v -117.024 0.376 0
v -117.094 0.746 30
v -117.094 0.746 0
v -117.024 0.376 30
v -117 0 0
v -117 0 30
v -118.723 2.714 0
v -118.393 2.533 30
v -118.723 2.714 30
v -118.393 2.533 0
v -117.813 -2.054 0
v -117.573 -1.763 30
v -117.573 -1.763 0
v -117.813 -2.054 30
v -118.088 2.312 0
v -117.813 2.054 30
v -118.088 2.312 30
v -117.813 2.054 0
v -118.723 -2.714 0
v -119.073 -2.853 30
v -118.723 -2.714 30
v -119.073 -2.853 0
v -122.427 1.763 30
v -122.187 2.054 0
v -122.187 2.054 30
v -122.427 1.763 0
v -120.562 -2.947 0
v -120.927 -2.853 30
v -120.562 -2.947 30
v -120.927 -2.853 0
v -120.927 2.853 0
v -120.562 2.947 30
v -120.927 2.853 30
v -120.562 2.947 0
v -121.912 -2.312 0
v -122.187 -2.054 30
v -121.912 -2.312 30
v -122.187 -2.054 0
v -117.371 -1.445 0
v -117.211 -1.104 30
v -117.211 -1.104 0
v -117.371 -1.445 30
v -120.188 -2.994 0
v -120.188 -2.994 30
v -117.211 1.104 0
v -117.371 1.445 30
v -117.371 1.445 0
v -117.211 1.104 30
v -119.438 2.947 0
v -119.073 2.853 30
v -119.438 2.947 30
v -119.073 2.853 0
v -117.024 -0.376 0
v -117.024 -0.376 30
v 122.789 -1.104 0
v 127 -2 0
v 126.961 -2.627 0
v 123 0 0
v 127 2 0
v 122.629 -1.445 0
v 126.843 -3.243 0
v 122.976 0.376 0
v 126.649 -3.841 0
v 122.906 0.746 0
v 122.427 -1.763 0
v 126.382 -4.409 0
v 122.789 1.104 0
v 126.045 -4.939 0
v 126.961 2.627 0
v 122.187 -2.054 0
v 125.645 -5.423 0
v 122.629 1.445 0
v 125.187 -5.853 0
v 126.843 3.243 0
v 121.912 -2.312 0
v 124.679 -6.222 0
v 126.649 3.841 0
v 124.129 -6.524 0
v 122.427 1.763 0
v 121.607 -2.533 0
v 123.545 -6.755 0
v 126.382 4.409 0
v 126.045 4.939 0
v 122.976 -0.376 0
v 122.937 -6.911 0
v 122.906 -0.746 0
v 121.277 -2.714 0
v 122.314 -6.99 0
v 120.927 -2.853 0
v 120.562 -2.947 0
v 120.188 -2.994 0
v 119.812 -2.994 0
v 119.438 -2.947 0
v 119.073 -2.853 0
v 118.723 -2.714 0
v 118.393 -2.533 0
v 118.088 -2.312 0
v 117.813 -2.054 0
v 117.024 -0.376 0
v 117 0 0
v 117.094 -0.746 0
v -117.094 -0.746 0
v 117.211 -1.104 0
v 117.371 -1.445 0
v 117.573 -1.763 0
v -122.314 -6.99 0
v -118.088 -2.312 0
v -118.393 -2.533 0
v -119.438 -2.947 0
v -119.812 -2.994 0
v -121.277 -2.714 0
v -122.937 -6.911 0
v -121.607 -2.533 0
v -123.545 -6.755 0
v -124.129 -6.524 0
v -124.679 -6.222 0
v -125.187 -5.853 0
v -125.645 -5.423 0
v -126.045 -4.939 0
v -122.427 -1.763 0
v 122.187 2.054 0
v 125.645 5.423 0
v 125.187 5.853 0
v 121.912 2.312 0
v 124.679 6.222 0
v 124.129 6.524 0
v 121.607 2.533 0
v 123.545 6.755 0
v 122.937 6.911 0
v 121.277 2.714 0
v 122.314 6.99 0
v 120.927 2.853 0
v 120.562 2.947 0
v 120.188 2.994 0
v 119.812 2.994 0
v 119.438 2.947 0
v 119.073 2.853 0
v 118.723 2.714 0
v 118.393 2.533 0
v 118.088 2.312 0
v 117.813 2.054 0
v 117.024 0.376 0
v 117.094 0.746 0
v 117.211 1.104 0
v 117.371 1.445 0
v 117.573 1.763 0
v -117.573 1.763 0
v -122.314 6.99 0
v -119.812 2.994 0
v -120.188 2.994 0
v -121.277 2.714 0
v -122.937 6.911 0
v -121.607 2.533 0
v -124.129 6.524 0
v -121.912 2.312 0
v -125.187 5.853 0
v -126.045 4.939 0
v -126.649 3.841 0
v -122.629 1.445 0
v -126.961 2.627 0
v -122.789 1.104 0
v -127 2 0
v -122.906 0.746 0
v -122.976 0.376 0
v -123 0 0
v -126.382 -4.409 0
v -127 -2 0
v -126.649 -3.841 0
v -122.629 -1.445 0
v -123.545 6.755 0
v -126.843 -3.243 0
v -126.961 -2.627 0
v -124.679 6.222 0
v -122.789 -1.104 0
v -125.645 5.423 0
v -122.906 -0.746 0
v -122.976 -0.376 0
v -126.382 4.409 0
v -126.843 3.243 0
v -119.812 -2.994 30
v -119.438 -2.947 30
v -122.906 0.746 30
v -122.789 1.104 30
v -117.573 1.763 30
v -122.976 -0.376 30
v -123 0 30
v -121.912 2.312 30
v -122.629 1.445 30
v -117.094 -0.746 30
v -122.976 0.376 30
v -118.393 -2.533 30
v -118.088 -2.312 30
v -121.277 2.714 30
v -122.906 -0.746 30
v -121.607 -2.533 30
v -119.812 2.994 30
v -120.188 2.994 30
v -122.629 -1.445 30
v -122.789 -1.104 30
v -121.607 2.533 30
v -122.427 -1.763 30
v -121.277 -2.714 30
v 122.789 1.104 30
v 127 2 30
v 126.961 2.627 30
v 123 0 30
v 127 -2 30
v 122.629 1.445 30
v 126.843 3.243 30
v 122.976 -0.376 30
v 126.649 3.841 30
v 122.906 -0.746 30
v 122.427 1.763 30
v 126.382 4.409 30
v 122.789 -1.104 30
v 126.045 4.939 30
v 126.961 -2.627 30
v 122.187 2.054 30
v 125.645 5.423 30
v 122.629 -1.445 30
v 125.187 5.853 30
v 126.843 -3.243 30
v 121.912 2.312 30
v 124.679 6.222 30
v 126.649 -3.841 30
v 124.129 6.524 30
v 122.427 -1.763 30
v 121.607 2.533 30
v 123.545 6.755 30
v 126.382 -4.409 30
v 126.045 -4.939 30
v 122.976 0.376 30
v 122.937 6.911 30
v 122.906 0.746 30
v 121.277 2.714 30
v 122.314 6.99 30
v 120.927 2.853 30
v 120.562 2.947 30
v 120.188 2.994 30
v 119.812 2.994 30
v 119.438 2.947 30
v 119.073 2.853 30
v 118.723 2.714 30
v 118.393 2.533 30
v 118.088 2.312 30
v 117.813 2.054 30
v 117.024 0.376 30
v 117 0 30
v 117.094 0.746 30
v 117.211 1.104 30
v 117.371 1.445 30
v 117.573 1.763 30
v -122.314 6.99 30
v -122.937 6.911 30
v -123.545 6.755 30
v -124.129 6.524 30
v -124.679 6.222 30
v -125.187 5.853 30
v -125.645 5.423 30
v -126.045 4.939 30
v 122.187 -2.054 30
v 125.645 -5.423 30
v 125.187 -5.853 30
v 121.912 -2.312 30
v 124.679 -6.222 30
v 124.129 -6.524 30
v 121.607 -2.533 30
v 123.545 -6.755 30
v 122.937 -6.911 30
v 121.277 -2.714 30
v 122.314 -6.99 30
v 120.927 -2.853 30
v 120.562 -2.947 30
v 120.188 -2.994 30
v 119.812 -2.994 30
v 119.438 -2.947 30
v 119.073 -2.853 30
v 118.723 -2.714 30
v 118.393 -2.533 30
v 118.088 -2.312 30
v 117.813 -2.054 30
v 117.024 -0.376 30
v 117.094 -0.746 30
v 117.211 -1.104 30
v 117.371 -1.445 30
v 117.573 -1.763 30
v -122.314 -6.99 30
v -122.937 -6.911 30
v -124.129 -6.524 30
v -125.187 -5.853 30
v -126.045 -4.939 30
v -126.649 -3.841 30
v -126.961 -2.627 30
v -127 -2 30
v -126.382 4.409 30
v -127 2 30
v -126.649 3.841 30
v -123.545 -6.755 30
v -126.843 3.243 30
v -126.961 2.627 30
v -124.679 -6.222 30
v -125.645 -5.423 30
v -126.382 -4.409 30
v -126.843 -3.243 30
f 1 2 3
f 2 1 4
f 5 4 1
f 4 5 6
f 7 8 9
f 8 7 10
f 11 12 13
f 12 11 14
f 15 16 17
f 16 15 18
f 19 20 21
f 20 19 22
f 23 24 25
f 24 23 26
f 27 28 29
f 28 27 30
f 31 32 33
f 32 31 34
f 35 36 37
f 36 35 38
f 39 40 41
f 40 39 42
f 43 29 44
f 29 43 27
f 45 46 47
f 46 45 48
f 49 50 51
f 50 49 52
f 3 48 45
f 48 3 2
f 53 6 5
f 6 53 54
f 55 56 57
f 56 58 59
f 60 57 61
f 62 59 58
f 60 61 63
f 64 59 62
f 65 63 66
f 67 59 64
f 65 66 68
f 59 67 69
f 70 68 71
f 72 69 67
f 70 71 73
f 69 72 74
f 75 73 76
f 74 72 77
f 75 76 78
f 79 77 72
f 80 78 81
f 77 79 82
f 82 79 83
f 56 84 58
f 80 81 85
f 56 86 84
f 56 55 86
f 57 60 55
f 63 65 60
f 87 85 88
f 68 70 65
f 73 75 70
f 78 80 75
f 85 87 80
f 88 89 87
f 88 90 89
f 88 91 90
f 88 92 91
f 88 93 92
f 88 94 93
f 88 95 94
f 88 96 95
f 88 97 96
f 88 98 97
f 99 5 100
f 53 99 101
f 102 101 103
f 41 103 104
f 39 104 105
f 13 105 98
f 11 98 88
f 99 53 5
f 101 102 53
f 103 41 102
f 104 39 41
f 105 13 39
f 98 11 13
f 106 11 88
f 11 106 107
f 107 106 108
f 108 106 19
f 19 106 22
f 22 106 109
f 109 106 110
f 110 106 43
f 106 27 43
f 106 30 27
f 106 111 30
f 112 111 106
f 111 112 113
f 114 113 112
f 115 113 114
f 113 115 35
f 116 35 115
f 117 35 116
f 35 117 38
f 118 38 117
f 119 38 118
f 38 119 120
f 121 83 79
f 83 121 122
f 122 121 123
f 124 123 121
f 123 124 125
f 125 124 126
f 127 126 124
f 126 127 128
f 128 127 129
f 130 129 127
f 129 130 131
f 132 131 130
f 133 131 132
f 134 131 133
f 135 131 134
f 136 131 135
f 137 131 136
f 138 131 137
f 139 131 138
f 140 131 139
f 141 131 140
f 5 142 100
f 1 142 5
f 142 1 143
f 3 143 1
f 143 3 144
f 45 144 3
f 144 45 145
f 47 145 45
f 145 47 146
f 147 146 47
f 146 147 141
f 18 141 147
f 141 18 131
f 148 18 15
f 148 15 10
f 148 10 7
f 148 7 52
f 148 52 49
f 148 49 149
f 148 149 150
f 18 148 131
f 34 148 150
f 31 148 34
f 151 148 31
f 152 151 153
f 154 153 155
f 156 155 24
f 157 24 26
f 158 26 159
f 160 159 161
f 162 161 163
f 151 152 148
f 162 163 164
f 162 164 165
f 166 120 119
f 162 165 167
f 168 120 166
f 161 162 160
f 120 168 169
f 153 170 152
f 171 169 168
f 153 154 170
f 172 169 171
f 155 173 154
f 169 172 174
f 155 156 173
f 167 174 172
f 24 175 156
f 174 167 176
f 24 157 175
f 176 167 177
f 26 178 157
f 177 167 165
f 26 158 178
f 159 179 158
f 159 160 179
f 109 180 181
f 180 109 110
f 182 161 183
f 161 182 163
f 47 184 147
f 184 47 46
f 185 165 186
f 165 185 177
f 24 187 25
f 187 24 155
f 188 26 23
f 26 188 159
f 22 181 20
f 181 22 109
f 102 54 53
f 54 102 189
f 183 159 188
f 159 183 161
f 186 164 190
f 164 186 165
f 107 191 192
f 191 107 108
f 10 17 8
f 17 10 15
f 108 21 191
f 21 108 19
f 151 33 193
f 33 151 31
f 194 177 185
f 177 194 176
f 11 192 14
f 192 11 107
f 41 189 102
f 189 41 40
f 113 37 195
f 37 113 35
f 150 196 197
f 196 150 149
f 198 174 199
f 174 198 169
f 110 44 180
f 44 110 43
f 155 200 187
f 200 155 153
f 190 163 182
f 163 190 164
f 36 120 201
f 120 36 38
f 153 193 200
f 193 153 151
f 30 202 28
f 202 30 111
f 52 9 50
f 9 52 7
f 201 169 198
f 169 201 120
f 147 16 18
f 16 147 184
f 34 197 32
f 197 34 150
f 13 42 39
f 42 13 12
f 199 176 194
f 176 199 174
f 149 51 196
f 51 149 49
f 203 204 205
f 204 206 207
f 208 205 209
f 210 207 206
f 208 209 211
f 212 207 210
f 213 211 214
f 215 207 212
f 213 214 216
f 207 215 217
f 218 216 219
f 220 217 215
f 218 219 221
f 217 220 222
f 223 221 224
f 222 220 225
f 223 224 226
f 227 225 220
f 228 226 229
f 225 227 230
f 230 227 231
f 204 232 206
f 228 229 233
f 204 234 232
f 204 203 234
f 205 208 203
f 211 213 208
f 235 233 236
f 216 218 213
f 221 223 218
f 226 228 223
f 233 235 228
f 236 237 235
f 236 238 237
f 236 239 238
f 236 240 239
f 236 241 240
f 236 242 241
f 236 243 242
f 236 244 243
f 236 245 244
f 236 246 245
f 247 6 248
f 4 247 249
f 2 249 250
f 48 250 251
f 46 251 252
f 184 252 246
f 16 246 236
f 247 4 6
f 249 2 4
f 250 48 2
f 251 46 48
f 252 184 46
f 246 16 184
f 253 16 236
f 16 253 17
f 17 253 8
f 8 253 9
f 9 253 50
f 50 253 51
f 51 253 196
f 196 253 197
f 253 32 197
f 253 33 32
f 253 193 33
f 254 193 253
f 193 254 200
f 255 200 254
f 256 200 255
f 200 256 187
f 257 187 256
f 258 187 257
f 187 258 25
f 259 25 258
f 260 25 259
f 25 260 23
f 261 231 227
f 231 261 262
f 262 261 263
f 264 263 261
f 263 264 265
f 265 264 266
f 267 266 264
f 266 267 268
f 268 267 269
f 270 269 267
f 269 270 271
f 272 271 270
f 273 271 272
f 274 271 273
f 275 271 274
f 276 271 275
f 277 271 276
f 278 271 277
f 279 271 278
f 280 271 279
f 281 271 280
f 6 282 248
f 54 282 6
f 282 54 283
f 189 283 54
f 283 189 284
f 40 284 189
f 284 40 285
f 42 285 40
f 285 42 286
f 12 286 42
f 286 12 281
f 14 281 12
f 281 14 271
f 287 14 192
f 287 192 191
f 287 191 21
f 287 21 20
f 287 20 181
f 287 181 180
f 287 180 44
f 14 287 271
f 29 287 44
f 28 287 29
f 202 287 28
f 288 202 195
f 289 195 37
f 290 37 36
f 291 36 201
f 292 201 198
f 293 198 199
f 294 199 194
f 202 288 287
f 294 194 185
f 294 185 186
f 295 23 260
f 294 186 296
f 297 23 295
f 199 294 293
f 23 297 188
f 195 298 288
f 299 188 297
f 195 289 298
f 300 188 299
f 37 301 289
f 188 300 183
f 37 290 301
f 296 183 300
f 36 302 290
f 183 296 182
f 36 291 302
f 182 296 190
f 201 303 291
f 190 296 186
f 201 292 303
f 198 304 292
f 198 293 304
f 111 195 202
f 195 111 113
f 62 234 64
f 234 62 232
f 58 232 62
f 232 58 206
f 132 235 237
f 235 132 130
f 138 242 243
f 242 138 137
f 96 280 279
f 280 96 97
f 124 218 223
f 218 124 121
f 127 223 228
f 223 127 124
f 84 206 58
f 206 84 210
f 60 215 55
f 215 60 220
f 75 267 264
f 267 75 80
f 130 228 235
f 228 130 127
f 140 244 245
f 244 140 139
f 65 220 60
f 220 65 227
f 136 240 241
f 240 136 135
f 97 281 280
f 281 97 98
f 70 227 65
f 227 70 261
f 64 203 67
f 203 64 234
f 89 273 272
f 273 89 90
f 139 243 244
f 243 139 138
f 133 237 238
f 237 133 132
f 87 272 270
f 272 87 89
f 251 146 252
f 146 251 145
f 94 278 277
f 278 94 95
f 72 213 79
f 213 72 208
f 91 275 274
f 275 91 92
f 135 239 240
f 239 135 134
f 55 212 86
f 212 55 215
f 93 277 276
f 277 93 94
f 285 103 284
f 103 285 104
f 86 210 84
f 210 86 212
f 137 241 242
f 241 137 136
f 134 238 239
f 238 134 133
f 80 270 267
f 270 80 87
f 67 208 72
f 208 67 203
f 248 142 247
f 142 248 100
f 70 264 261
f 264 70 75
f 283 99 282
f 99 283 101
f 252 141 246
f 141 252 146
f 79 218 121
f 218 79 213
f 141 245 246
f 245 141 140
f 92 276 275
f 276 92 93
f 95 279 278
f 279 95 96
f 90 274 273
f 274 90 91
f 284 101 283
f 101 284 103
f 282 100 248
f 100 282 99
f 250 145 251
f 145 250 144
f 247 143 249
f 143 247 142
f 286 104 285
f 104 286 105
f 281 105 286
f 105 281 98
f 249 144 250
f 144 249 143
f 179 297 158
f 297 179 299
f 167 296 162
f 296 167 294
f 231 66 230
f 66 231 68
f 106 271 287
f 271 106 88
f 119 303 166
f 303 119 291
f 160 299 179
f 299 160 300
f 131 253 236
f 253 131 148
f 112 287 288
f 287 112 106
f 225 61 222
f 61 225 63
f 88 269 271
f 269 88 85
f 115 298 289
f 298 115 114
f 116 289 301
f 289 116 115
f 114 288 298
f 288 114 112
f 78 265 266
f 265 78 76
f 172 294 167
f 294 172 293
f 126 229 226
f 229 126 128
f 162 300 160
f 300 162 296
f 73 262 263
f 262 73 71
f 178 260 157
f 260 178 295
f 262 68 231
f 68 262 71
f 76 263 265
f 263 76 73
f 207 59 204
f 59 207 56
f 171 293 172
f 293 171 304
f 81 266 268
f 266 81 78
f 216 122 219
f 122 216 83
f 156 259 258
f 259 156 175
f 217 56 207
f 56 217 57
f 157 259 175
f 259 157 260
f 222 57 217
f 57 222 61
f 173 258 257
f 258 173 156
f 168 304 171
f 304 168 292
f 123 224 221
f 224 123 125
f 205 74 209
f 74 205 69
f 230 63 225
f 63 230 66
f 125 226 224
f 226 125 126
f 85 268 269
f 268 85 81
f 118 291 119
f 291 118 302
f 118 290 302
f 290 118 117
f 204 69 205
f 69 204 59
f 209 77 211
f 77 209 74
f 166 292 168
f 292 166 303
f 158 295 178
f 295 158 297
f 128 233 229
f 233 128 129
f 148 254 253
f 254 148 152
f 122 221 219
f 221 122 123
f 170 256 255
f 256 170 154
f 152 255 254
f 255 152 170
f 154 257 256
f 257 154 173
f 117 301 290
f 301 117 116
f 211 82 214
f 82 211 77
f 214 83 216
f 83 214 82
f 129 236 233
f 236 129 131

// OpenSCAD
$fn = 50;


difference() {
	union() {
		hull() {
			translate(v = [-122.0000000000, 2.0000000000, 0]) {
				cylinder(h = 30, r = 5);
			}
			translate(v = [122.0000000000, 2.0000000000, 0]) {
				cylinder(h = 30, r = 5);
			}
			translate(v = [-122.0000000000, -2.0000000000, 0]) {
				cylinder(h = 30, r = 5);
			}
			translate(v = [122.0000000000, -2.0000000000, 0]) {
				cylinder(h = 30, r = 5);
			}
		}
	}
	union() {
		translate(v = [-120.0000000000, 0.0000000000, 0]) {
			cylinder(h = 30, r = 3.0000000000);
		}
		translate(v = [120.0000000000, 0.0000000000, 0]) {
			cylinder(h = 30, r = 3.0000000000);
		}
		translate(v = [-120.0000000000, 0.0000000000, 0]) {
			cylinder(h = 30, r = 1.5000000000);
		}
		translate(v = [120.0000000000, 0.0000000000, 0]) {
			cylinder(h = 30, r = 1.5000000000);
		}
		translate(v = [-120.0000000000, 0.0000000000, 0]) {
			cylinder(h = 30, r = 1.5000000000);
		}
		translate(v = [120.0000000000, 0.0000000000, 0]) {
			cylinder(h = 30, r = 1.5000000000);
		}
		translate(v = [-120.0000000000, 0.0000000000, 0]) {
			cylinder(h = 30, r = 1.5000000000);
		}
		translate(v = [120.0000000000, 0.0000000000, 0]) {
			cylinder(h = 30, r = 1.5000000000);
		}
	}
}
